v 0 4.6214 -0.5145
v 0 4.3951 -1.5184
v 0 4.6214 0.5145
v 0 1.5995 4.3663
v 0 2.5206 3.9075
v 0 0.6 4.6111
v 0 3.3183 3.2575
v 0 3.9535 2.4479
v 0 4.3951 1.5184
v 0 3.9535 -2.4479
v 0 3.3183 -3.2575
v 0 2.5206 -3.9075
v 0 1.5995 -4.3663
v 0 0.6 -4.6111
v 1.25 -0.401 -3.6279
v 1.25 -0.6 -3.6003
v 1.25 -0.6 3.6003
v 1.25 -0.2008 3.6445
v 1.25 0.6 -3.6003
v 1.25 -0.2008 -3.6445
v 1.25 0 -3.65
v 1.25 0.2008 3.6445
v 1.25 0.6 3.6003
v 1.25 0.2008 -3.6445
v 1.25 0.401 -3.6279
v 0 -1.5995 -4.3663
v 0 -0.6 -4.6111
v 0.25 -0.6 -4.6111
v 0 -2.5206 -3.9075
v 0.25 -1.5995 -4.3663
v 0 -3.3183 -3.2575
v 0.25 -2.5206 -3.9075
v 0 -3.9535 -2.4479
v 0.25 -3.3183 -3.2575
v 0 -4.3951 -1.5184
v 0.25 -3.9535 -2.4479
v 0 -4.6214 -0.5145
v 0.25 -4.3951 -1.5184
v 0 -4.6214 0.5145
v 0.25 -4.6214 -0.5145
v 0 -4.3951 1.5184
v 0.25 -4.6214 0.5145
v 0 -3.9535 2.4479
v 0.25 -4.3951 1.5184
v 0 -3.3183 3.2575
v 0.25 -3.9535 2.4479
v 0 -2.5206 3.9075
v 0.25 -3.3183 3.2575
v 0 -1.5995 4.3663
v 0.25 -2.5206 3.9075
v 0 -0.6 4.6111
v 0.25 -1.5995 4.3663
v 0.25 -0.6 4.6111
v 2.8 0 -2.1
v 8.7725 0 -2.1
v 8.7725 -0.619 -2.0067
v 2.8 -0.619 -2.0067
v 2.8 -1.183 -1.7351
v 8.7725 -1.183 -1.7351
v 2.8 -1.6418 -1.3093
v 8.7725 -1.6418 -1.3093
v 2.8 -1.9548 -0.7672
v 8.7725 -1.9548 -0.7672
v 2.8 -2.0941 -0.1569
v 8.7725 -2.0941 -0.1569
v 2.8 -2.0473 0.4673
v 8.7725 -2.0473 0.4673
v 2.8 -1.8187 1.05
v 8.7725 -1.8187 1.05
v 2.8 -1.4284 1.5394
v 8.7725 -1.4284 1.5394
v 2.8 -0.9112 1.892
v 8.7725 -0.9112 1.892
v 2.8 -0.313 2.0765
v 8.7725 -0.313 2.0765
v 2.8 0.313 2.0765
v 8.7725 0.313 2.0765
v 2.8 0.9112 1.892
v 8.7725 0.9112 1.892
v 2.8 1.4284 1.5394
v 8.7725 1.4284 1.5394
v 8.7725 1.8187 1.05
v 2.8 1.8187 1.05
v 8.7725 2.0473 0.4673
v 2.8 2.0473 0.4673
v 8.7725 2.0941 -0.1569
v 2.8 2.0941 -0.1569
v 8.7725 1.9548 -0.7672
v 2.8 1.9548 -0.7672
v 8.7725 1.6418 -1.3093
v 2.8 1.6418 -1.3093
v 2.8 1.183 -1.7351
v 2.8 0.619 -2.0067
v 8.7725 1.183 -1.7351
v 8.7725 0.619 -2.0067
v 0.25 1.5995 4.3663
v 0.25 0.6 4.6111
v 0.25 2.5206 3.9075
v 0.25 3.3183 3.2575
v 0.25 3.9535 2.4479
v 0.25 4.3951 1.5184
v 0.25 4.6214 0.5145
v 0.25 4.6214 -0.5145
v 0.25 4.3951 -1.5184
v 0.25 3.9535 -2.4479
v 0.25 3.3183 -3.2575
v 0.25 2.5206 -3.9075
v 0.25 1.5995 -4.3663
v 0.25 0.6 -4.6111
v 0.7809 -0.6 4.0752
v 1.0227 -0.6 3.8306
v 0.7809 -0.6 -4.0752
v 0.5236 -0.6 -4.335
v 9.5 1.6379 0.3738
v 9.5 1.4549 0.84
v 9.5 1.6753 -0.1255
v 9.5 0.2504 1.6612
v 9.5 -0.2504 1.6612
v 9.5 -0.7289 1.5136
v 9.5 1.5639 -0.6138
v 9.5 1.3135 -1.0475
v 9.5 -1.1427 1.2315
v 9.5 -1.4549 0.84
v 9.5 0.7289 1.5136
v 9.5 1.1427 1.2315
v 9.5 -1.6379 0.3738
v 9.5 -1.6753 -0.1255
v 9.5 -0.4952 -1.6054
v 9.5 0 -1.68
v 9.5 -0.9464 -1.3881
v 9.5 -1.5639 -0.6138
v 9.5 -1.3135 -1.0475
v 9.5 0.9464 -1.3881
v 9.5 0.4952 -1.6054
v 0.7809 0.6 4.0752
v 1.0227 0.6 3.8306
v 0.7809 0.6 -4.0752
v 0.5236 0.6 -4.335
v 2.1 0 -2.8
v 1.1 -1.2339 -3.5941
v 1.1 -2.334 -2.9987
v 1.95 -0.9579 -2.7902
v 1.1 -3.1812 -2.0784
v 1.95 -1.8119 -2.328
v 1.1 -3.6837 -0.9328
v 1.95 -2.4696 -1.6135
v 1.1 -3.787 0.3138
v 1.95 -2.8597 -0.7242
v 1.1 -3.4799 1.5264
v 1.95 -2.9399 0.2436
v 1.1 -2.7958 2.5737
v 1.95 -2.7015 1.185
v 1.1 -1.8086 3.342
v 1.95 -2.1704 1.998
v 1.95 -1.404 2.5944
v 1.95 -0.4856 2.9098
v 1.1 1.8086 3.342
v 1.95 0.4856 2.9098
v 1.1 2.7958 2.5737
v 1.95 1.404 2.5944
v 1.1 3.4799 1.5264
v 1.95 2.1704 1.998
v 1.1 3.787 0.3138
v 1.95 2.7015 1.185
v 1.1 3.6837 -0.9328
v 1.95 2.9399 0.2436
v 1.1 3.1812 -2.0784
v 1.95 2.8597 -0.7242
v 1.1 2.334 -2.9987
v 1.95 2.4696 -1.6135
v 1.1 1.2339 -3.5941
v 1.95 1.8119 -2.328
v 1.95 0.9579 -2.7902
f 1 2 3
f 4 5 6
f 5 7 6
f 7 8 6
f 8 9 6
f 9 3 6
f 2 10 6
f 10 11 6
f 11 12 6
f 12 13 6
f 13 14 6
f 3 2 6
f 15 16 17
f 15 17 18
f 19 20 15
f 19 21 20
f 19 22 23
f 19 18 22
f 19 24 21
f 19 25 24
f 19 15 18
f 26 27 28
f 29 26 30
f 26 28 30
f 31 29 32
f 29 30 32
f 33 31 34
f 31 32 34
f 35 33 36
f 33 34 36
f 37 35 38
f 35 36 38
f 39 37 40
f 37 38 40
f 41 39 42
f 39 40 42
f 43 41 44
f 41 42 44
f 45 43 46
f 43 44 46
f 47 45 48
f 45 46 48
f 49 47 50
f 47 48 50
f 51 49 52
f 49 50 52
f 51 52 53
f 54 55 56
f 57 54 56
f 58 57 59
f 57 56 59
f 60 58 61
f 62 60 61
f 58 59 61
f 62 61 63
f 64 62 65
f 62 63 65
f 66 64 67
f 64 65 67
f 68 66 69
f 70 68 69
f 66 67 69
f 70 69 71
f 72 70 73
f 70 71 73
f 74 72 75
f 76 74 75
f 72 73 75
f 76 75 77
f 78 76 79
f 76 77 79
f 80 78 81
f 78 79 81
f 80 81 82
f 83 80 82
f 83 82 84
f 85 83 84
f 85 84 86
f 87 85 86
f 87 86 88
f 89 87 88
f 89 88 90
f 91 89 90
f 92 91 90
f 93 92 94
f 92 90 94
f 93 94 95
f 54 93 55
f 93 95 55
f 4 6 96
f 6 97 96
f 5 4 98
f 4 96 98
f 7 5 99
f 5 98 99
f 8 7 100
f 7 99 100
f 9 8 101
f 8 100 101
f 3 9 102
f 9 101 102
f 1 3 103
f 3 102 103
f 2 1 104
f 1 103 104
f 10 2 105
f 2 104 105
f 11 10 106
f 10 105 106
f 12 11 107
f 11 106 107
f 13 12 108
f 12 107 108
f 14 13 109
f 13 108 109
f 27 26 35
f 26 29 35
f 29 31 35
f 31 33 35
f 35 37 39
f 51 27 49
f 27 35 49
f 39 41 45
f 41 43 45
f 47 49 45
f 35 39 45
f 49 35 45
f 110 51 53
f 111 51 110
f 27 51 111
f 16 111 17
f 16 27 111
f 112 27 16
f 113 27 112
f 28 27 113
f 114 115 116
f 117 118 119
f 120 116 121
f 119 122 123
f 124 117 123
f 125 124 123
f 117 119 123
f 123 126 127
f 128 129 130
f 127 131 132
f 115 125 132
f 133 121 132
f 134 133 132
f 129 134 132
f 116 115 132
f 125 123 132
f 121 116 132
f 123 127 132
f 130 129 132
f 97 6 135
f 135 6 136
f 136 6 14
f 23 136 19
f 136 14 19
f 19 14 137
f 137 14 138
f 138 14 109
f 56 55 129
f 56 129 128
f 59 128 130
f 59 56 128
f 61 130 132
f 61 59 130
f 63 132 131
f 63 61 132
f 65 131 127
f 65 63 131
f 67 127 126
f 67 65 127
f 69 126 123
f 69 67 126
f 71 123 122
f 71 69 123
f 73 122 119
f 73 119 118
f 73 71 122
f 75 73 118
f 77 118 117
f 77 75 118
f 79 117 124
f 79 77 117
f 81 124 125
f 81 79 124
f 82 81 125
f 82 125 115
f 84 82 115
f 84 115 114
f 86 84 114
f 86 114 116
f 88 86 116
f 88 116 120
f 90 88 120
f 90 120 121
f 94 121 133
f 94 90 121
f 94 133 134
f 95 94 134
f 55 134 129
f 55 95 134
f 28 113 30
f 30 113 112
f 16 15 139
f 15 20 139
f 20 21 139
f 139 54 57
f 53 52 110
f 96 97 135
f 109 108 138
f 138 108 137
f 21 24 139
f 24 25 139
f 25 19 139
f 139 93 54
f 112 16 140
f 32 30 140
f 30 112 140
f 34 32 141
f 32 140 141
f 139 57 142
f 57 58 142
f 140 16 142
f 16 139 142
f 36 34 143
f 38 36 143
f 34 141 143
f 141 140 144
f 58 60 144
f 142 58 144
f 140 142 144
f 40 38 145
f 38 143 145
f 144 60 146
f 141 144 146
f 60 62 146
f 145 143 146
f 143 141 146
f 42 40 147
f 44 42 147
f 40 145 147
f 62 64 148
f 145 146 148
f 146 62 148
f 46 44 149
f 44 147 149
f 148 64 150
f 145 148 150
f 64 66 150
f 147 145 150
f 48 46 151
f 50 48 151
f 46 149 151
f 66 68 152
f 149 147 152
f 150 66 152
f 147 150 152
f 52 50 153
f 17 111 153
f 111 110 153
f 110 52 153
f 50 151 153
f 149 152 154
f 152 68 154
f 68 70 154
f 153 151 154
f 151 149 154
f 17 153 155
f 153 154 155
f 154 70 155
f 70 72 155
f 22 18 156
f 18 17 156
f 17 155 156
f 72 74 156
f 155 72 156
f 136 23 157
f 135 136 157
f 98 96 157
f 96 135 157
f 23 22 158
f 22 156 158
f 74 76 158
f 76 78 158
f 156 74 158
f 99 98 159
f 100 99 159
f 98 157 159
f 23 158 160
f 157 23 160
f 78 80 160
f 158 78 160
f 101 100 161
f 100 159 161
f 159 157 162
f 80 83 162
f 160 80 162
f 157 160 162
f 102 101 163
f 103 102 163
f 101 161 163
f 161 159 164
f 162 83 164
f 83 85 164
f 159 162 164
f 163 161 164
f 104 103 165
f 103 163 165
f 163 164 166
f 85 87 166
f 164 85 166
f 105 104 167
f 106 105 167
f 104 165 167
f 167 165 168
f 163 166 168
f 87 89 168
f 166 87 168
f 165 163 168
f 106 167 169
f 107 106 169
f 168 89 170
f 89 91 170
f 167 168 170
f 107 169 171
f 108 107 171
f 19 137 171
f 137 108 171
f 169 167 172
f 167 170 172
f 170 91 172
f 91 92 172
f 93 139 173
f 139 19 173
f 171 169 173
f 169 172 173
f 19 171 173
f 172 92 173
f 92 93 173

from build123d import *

# Parameters (mm, degrees)
CUT_EXTRUDE1_DEPTH      = 12.554003635
CUT_EXTRUDE1_DEPTH_BACK = 12.554003635
SKETCH2_W               = 1.25
SKETCH2_H               = 1.2
CHAMFER1_SIZE           = 0.42
CHAMFER1_SIZE2          = 0.727461339


with BuildPart() as part:
    # Sketch1 → Revolve1 (revolve)
    with BuildSketch(Plane.XY, mode=Mode.PRIVATE) as revolve1_sk:
        Polygon((0, 4.65), (0.25, 4.65), (2.8, 2.1), (9.5, 2.1), (9.5, 0), (0, 0), align=None)
    revolve(revolve1_sk.sketch.rotate(Axis((6.620684694, 0, 0), (-1, 0, 0)), 90), axis=Axis((6.620684694, 0, 0), (-1, 0, 0)))

    # Sketch2 → Cut-Extrude1 (cut, two sides: drawn at the far end of the back side and taken through both)
    with BuildSketch(Plane.XY.offset(-CUT_EXTRUDE1_DEPTH_BACK)):
        with Locations((0.625, 0)):
            Rectangle(SKETCH2_W, SKETCH2_H)
    extrude(amount=CUT_EXTRUDE1_DEPTH + CUT_EXTRUDE1_DEPTH_BACK, mode=Mode.SUBTRACT)

    # Chamfer1
    chamfer1_edges = [part.edges().sort_by_distance(p)[0] for p in [
        (9.5, 0, 2.1),
    ]]
    chamfer1_side = [part.faces().sort_by_distance(p)[0] for p in [
        (9.5, 0, 0),
    ]]
    chamfer(chamfer1_edges, length=CHAMFER1_SIZE, length2=CHAMFER1_SIZE2, reference=chamfer1_side[0])


solid = part.part
